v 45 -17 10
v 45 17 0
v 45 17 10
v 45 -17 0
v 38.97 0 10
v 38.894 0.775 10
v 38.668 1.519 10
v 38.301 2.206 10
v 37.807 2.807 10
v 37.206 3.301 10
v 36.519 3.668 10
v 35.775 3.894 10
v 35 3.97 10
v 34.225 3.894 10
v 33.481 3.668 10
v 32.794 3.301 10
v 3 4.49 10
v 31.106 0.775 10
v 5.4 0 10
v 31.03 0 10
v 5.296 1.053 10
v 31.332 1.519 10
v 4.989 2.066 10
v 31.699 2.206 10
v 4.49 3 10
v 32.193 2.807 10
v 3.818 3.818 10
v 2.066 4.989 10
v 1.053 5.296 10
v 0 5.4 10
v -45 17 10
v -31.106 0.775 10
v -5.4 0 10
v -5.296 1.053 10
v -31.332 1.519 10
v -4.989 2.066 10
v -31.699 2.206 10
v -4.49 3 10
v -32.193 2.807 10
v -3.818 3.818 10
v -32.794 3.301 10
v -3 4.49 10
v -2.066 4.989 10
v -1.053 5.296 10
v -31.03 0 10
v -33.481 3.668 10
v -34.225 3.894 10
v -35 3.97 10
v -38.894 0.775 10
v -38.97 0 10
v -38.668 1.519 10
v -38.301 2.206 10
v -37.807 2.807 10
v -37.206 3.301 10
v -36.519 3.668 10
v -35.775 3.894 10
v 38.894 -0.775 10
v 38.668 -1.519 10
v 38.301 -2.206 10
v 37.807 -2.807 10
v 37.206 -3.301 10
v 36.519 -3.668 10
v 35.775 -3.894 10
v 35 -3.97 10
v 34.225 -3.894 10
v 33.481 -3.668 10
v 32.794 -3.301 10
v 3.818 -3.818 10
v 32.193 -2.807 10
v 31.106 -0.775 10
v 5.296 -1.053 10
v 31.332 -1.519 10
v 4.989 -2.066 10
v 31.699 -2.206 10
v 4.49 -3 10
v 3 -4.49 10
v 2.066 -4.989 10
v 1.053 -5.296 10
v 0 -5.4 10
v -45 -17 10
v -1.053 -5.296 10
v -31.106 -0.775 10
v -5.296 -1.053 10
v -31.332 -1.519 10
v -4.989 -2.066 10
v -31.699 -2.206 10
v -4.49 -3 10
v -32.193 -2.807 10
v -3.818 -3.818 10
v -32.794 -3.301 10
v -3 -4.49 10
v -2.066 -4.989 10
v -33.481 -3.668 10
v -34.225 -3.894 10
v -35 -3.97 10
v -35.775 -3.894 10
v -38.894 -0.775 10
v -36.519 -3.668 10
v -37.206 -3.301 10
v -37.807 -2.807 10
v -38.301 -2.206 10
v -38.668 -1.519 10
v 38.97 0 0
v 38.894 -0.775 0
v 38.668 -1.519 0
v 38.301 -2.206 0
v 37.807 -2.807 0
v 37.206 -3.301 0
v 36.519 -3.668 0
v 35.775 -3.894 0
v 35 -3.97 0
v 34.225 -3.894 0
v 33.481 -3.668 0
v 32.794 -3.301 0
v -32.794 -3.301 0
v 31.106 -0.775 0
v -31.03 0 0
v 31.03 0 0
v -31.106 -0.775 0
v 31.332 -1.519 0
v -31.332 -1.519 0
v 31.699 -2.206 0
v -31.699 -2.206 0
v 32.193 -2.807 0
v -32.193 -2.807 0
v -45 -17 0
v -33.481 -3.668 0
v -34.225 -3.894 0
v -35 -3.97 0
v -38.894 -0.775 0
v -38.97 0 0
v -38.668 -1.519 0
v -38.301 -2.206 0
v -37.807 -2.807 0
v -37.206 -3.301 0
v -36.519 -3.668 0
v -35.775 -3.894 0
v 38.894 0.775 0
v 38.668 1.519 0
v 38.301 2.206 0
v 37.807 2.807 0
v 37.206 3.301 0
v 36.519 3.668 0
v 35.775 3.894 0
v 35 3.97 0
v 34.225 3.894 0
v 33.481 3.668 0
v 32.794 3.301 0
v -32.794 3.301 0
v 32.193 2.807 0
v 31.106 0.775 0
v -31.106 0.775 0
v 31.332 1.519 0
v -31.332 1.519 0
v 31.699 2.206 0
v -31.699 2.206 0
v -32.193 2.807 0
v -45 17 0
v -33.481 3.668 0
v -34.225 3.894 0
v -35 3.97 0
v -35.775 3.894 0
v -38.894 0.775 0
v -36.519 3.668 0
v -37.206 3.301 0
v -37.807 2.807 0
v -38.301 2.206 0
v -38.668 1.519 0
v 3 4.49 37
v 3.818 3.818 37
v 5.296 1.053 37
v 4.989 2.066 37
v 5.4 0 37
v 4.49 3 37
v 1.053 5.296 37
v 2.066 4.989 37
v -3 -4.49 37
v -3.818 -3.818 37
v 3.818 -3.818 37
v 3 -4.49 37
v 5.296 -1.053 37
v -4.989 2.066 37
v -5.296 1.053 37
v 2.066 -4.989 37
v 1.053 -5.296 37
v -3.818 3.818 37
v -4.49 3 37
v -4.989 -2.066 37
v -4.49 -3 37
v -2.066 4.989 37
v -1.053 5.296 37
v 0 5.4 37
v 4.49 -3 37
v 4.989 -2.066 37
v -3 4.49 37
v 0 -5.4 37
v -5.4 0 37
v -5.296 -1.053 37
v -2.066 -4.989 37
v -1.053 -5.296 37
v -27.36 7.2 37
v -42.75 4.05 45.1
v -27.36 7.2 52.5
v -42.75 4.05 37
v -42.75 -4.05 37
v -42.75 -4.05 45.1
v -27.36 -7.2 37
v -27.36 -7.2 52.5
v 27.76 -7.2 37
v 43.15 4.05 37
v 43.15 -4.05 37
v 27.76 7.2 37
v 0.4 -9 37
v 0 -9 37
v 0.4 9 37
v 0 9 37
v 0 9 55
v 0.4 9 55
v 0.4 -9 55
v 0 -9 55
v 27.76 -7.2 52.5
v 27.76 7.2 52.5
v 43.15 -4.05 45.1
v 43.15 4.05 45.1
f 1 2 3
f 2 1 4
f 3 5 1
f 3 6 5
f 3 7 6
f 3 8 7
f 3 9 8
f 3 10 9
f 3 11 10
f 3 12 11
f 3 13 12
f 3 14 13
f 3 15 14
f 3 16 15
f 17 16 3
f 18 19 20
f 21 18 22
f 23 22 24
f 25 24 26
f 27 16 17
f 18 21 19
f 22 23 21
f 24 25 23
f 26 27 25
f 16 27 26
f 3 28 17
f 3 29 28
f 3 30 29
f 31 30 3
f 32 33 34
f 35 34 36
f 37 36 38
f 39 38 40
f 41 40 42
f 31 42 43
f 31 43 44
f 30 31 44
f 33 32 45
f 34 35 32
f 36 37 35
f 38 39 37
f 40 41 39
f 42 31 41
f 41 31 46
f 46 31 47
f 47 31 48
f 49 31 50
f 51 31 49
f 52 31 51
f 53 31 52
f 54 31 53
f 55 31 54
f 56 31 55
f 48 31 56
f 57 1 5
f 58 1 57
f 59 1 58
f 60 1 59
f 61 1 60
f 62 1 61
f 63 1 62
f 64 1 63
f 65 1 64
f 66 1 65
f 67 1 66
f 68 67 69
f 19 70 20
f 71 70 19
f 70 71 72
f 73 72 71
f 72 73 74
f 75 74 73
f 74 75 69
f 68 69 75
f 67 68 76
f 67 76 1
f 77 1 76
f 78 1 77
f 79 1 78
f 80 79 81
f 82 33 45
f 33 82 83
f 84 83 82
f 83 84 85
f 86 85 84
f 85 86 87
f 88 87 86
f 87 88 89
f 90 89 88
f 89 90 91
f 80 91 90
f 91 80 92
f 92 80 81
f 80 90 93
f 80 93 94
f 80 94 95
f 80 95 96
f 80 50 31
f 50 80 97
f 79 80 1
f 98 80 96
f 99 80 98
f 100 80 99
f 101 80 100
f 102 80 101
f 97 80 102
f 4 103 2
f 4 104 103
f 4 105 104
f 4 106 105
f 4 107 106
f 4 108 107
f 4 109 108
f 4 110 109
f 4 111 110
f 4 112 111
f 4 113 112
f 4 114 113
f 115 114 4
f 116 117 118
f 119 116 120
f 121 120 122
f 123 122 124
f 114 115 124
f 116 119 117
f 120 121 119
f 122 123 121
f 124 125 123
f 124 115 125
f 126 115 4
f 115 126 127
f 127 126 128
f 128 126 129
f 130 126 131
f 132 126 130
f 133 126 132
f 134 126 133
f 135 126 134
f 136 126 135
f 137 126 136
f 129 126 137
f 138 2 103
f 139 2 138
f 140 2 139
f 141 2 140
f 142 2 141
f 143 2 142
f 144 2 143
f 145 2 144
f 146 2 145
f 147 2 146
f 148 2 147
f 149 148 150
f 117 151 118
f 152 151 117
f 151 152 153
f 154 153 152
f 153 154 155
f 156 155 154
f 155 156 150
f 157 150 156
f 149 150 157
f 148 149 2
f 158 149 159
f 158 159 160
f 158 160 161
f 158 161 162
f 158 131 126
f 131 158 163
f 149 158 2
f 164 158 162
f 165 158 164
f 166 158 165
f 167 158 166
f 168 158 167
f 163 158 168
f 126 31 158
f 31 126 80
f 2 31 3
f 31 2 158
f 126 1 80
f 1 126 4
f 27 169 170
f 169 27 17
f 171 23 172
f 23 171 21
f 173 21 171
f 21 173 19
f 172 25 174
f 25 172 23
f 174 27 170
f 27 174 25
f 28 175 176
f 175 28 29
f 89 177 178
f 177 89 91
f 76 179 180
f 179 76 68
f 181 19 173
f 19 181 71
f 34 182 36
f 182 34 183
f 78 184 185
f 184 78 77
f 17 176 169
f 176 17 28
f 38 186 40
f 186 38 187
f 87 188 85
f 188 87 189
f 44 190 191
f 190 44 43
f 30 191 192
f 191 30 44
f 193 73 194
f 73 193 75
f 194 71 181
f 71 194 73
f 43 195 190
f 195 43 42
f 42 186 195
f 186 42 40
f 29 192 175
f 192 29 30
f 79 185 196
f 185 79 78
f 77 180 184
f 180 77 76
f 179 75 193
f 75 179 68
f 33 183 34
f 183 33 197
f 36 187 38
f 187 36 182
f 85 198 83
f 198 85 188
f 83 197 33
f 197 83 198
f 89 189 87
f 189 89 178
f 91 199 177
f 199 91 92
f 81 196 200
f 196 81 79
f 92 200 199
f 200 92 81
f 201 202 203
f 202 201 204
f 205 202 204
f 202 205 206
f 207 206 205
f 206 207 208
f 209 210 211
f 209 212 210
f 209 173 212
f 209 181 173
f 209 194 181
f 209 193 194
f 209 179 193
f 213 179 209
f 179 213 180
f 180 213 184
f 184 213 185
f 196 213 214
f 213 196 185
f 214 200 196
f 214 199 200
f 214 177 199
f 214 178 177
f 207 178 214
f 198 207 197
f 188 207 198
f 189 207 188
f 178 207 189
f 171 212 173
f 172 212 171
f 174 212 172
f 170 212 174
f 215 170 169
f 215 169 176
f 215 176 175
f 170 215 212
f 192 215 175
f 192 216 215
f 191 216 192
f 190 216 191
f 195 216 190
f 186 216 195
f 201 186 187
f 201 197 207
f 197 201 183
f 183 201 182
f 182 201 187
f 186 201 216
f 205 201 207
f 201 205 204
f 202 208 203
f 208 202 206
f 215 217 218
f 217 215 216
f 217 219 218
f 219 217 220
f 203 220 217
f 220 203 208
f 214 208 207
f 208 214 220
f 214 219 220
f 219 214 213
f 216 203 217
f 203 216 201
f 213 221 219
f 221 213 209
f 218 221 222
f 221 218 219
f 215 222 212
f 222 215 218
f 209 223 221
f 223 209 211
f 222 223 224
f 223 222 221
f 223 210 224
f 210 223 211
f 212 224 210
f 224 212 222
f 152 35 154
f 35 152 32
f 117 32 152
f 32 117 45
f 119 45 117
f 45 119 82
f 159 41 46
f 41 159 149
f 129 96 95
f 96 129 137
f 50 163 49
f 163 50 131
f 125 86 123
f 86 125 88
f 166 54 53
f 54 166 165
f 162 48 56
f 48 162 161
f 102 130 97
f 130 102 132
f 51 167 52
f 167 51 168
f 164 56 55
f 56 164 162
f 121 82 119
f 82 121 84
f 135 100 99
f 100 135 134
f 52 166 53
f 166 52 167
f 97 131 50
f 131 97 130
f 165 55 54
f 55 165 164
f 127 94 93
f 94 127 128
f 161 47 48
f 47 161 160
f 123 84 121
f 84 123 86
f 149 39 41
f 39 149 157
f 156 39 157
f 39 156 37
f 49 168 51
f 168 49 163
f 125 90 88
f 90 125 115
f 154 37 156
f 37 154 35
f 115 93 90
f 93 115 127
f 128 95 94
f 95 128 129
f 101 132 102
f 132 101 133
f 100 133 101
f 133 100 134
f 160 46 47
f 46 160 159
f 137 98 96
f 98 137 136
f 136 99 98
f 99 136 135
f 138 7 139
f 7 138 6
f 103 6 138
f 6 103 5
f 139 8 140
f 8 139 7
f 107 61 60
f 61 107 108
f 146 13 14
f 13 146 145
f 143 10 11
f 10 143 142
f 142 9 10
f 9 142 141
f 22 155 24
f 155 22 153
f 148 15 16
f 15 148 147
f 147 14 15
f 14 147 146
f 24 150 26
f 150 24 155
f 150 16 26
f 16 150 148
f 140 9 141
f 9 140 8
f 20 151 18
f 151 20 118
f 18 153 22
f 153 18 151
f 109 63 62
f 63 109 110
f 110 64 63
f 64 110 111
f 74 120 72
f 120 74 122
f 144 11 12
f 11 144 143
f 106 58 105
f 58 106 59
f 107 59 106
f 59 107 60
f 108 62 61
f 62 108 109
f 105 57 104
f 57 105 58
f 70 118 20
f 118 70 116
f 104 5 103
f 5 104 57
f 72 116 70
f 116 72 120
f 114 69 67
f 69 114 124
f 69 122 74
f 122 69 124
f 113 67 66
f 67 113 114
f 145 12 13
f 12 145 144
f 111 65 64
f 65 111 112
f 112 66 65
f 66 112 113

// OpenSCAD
$fn = 32;

// ----------------------------------------------------------------------
// Boat cleat: 90 mm base, horn 46 mm up
// ----------------------------------------------------------------------

// --- parameters (mm) ---
base_l = 90;              // base length
base_w = 34;              // base width
base_t = 10;              // base thickness
horn_len = 85.5;          // horn length
horn_d = 18;              // horn diameter at the middle
horn_z = 46;              // horn axis height
end_drop = 10;            // how far the horn tips drop
post_d = 10.8;            // centre post diameter
holes_d = 7.94;           // fixing holes
hole_x = 35;              // fixing hole spacing

difference() {
  union() {
    translate([-45, -17, 0]) cube([base_l, base_w, base_t]);
    /* centre post, sunk 1 mm into the base */
    translate([0, 0, 9]) cylinder(h = 37, d = post_d);
    /* horn: a hull chain of boxes, full in the middle and lighter at the tips */
    hull() {
      translate([-42.75, -4.05, 37]) cube([0.4, 8.1, 8.1], center = false);
      translate([-27.36, -7.2, 37]) cube([0.4, 14.4, 15.5], center = false);
    }
    hull() {
      translate([-27.36, -7.2, 37]) cube([0.4, 14.4, 15.5], center = false);
      translate([0, -9, 37]) cube([0.4, 18, 18], center = false);
    }
    hull() {
      translate([0, -9, 37]) cube([0.4, 18, 18], center = false);
      translate([27.36, -7.2, 37]) cube([0.4, 14.4, 15.5], center = false);
    }
    hull() {
      translate([27.36, -7.2, 37]) cube([0.4, 14.4, 15.5], center = false);
      translate([42.75, -4.05, 37]) cube([0.4, 8.1, 8.1], center = false);
    }
  }
  translate([-35, 0, -2.5]) cylinder(h = base_t + 5, d = holes_d);
  translate([35, 0, -2.5]) cylinder(h = base_t + 5, d = holes_d);
}
